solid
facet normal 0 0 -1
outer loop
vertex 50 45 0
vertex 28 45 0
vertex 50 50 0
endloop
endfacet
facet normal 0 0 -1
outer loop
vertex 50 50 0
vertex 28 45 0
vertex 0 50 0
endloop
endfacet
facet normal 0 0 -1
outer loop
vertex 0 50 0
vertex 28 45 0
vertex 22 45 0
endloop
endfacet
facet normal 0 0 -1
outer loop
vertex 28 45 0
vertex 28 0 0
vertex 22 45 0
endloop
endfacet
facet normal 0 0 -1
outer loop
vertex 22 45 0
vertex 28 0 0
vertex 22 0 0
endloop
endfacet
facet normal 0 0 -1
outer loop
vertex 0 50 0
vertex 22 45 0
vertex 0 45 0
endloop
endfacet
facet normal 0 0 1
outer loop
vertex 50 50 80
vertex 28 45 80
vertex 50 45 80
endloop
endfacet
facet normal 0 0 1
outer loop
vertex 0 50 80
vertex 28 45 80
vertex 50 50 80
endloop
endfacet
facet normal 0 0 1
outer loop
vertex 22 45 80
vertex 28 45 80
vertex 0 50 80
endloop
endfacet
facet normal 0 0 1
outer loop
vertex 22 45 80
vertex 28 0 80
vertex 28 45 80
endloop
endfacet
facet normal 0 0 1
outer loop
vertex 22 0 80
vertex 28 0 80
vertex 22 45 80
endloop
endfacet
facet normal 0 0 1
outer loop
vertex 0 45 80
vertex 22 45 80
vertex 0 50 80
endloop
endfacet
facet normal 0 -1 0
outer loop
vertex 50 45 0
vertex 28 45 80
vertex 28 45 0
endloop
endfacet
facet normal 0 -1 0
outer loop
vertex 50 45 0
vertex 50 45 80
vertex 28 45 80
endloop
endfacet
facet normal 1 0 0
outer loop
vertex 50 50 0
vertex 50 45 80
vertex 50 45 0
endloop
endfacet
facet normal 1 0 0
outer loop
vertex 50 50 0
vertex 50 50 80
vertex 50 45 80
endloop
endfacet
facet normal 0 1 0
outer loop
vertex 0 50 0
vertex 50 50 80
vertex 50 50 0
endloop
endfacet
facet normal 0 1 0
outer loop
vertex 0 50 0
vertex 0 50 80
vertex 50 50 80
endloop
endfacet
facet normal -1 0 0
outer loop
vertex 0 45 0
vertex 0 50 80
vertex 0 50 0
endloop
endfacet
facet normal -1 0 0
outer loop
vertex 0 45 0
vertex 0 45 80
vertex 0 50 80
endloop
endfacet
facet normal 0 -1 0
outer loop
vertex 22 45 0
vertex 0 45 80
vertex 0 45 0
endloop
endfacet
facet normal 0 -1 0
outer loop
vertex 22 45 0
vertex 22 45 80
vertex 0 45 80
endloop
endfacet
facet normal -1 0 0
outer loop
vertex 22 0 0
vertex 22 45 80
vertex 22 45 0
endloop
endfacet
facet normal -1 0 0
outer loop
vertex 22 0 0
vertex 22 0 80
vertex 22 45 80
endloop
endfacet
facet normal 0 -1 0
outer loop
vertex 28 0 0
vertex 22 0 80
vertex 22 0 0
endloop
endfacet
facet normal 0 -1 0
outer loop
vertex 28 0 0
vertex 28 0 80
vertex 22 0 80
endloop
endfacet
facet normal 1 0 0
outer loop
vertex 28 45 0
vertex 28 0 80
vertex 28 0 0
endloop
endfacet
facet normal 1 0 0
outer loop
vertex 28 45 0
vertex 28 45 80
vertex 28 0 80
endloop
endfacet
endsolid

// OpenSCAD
$fn = 32;

// ----------------------------------------------------------------------
// Structural section: tee 50 x 50 mm
// ----------------------------------------------------------------------

// --- parameters (mm) ---
sec_w = 50;               // tee width, X
sec_h = 50;               // tee height, Y
flange_t = 5;             // top flange thickness
web_t = 6;                // web thickness
plate_t = 80;             // cut length, Z (extrusion height)

profile = [[22, 0], [28, 0], [28, 45], [50, 45], [50, 50], [0, 50], [0, 45], [22, 45]];  // primary outline, 8 points, counter clockwise

// --- the one profile operation ---
linear_extrude(height = plate_t) polygon(points = profile);
